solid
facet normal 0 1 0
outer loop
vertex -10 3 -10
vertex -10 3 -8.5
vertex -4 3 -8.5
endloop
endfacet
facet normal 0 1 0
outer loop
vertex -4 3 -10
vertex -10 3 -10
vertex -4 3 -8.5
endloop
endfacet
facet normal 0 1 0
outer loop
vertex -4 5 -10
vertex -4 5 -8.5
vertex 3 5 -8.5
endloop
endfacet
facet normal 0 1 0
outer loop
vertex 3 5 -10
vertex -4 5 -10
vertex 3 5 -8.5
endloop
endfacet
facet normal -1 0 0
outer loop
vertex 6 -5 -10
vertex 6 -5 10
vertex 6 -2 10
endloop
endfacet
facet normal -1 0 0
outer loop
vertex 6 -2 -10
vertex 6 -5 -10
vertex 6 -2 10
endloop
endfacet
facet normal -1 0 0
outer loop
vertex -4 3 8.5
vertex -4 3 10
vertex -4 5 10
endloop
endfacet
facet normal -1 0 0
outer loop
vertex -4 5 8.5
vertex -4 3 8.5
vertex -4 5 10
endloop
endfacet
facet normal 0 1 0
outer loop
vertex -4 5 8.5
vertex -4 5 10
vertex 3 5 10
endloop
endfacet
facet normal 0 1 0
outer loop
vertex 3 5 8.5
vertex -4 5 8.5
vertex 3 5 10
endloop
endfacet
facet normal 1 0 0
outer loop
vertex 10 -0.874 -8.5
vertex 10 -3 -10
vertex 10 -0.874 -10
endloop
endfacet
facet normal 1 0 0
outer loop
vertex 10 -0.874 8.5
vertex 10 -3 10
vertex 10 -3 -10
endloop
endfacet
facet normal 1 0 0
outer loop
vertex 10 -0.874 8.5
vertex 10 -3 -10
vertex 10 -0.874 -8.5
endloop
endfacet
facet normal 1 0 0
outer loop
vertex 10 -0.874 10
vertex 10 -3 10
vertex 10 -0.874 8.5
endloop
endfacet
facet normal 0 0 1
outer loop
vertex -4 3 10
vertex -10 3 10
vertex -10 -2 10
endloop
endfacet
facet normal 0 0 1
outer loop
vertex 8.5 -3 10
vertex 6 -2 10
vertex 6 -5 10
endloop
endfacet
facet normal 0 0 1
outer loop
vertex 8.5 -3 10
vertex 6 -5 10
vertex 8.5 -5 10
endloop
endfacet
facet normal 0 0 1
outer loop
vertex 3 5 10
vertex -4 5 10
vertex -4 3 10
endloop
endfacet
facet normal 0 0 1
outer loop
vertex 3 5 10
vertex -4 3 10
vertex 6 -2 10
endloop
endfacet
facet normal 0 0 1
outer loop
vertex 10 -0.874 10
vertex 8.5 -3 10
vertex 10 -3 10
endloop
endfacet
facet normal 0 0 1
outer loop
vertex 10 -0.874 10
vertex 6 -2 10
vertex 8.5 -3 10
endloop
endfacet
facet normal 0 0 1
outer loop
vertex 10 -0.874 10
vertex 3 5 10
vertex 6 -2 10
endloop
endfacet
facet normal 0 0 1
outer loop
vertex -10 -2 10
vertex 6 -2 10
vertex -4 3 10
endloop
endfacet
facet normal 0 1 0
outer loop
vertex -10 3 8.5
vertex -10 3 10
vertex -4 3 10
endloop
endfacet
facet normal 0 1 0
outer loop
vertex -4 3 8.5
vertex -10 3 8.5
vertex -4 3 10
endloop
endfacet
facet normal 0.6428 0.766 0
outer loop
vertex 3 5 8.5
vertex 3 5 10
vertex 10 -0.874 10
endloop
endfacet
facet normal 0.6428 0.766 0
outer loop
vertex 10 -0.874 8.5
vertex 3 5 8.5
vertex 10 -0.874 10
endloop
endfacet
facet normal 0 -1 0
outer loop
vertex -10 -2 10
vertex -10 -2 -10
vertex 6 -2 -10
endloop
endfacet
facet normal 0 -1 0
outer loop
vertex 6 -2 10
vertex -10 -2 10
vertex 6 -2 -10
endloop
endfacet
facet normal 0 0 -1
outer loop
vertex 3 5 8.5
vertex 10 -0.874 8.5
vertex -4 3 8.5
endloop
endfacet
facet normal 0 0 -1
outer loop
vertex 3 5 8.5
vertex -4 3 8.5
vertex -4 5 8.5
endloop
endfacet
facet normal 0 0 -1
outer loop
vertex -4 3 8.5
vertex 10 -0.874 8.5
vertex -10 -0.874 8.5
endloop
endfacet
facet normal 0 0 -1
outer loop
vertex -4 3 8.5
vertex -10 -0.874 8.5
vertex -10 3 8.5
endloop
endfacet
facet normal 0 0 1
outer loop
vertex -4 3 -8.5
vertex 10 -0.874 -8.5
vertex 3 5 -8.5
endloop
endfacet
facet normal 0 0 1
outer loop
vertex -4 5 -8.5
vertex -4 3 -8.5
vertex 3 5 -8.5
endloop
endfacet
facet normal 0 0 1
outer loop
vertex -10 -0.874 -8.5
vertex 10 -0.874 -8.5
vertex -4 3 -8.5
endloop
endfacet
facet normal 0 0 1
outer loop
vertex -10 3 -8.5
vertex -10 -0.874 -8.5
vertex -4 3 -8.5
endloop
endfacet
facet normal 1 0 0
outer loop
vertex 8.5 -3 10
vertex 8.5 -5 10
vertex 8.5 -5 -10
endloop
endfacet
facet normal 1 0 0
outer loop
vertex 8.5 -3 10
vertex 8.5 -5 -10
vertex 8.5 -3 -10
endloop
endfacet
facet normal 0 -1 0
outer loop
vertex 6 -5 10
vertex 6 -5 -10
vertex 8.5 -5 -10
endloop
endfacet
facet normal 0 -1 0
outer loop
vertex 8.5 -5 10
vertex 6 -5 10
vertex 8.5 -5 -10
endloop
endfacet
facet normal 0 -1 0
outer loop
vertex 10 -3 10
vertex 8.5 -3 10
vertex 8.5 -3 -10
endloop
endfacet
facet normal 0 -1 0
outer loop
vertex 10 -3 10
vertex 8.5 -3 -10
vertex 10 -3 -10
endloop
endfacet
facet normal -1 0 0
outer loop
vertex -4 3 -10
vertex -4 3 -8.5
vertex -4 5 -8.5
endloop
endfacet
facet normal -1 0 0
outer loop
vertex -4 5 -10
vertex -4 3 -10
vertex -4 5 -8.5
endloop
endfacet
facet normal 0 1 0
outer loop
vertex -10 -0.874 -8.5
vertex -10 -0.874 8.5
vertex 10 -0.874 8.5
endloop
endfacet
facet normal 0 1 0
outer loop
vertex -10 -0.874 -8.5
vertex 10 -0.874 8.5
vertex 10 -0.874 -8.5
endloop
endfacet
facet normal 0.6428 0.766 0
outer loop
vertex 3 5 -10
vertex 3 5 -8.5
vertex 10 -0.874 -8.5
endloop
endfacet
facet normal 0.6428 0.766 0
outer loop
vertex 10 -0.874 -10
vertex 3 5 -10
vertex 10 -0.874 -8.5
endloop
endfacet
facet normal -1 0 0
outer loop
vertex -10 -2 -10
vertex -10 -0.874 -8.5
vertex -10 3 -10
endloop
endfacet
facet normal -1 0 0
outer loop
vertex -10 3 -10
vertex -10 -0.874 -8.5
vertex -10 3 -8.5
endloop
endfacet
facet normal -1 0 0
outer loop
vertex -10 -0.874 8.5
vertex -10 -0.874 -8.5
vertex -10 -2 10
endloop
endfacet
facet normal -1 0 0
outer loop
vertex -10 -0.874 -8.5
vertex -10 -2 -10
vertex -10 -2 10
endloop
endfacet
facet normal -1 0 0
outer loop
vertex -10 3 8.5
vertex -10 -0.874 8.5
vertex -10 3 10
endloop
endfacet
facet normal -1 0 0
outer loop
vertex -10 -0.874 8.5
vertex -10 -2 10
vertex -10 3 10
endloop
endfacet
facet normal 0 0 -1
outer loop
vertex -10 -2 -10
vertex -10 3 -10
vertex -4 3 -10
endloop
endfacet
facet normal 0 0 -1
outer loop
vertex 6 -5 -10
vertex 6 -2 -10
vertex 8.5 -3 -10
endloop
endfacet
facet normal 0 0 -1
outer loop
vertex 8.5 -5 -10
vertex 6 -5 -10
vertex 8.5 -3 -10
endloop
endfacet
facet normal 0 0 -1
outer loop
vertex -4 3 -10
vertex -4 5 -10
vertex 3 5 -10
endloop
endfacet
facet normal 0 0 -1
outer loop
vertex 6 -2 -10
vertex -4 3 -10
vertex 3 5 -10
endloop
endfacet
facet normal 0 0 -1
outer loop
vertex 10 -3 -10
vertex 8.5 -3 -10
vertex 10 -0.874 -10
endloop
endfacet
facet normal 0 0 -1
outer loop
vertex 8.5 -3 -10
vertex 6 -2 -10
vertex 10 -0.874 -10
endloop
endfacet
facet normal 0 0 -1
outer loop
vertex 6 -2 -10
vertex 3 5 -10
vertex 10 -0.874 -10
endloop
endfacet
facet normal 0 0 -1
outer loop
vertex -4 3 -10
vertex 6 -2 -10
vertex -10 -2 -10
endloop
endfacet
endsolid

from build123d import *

# Parameters (mm, degrees)
SKETCH_1_W               = 20
SKETCH_1_H               = 10
EXTRUDE_2_DEPTH          = 10
SKETCH_2_W               = 6
SKETCH_2_H               = 2
SKETCH_2_W_2             = 16
SKETCH_2_H_2             = 3
SKETCH_2_W_3             = 1.5
CUT_EXTRUDE_1_DEPTH      = 23.912878475
CUT_EXTRUDE_2_DEPTH      = 20
CUT_EXTRUDE_2_DEPTH_BACK = 20
SKETCH_7_W               = 17
SKETCH_7_H               = 5.873697418


with BuildPart() as part:
    # Эскиз1 → Бобышка-Вытянуть2 (new, symmetric)
    with BuildSketch(Plane.XY):
        Rectangle(SKETCH_1_W, SKETCH_1_H)
    extrude(amount=EXTRUDE_2_DEPTH, both=True)

    # Эскиз2 → Вырез-Вытянуть1 (cut, through all)
    with BuildSketch(Plane.XY.offset(10)):
        with Locations((-7, 4)):
            Rectangle(SKETCH_2_W, SKETCH_2_H)
        Polygon((10, 5), (3, 5), (10, -0.873697418), align=None)
        with Locations((-2, -3.5)):
            Rectangle(SKETCH_2_W_2, SKETCH_2_H_2)
        with Locations((9.25, -4)):
            Rectangle(SKETCH_2_W_3, SKETCH_2_H)
    extrude(amount=-CUT_EXTRUDE_1_DEPTH, mode=Mode.SUBTRACT)

    # Эскиз7 → Вырез-Вытянуть2 (cut, two sides: drawn at the far end of the back side and taken through both)
    with BuildSketch(Plane(origin=(0, 0, 0), x_dir=(0, 0, -1), z_dir=(1, 0, 0)).offset(-CUT_EXTRUDE_2_DEPTH_BACK)):
        with Locations((0, 2.063151291)):
            Rectangle(SKETCH_7_W, SKETCH_7_H)
    extrude(amount=CUT_EXTRUDE_2_DEPTH + CUT_EXTRUDE_2_DEPTH_BACK, mode=Mode.SUBTRACT)


solid = part.part
